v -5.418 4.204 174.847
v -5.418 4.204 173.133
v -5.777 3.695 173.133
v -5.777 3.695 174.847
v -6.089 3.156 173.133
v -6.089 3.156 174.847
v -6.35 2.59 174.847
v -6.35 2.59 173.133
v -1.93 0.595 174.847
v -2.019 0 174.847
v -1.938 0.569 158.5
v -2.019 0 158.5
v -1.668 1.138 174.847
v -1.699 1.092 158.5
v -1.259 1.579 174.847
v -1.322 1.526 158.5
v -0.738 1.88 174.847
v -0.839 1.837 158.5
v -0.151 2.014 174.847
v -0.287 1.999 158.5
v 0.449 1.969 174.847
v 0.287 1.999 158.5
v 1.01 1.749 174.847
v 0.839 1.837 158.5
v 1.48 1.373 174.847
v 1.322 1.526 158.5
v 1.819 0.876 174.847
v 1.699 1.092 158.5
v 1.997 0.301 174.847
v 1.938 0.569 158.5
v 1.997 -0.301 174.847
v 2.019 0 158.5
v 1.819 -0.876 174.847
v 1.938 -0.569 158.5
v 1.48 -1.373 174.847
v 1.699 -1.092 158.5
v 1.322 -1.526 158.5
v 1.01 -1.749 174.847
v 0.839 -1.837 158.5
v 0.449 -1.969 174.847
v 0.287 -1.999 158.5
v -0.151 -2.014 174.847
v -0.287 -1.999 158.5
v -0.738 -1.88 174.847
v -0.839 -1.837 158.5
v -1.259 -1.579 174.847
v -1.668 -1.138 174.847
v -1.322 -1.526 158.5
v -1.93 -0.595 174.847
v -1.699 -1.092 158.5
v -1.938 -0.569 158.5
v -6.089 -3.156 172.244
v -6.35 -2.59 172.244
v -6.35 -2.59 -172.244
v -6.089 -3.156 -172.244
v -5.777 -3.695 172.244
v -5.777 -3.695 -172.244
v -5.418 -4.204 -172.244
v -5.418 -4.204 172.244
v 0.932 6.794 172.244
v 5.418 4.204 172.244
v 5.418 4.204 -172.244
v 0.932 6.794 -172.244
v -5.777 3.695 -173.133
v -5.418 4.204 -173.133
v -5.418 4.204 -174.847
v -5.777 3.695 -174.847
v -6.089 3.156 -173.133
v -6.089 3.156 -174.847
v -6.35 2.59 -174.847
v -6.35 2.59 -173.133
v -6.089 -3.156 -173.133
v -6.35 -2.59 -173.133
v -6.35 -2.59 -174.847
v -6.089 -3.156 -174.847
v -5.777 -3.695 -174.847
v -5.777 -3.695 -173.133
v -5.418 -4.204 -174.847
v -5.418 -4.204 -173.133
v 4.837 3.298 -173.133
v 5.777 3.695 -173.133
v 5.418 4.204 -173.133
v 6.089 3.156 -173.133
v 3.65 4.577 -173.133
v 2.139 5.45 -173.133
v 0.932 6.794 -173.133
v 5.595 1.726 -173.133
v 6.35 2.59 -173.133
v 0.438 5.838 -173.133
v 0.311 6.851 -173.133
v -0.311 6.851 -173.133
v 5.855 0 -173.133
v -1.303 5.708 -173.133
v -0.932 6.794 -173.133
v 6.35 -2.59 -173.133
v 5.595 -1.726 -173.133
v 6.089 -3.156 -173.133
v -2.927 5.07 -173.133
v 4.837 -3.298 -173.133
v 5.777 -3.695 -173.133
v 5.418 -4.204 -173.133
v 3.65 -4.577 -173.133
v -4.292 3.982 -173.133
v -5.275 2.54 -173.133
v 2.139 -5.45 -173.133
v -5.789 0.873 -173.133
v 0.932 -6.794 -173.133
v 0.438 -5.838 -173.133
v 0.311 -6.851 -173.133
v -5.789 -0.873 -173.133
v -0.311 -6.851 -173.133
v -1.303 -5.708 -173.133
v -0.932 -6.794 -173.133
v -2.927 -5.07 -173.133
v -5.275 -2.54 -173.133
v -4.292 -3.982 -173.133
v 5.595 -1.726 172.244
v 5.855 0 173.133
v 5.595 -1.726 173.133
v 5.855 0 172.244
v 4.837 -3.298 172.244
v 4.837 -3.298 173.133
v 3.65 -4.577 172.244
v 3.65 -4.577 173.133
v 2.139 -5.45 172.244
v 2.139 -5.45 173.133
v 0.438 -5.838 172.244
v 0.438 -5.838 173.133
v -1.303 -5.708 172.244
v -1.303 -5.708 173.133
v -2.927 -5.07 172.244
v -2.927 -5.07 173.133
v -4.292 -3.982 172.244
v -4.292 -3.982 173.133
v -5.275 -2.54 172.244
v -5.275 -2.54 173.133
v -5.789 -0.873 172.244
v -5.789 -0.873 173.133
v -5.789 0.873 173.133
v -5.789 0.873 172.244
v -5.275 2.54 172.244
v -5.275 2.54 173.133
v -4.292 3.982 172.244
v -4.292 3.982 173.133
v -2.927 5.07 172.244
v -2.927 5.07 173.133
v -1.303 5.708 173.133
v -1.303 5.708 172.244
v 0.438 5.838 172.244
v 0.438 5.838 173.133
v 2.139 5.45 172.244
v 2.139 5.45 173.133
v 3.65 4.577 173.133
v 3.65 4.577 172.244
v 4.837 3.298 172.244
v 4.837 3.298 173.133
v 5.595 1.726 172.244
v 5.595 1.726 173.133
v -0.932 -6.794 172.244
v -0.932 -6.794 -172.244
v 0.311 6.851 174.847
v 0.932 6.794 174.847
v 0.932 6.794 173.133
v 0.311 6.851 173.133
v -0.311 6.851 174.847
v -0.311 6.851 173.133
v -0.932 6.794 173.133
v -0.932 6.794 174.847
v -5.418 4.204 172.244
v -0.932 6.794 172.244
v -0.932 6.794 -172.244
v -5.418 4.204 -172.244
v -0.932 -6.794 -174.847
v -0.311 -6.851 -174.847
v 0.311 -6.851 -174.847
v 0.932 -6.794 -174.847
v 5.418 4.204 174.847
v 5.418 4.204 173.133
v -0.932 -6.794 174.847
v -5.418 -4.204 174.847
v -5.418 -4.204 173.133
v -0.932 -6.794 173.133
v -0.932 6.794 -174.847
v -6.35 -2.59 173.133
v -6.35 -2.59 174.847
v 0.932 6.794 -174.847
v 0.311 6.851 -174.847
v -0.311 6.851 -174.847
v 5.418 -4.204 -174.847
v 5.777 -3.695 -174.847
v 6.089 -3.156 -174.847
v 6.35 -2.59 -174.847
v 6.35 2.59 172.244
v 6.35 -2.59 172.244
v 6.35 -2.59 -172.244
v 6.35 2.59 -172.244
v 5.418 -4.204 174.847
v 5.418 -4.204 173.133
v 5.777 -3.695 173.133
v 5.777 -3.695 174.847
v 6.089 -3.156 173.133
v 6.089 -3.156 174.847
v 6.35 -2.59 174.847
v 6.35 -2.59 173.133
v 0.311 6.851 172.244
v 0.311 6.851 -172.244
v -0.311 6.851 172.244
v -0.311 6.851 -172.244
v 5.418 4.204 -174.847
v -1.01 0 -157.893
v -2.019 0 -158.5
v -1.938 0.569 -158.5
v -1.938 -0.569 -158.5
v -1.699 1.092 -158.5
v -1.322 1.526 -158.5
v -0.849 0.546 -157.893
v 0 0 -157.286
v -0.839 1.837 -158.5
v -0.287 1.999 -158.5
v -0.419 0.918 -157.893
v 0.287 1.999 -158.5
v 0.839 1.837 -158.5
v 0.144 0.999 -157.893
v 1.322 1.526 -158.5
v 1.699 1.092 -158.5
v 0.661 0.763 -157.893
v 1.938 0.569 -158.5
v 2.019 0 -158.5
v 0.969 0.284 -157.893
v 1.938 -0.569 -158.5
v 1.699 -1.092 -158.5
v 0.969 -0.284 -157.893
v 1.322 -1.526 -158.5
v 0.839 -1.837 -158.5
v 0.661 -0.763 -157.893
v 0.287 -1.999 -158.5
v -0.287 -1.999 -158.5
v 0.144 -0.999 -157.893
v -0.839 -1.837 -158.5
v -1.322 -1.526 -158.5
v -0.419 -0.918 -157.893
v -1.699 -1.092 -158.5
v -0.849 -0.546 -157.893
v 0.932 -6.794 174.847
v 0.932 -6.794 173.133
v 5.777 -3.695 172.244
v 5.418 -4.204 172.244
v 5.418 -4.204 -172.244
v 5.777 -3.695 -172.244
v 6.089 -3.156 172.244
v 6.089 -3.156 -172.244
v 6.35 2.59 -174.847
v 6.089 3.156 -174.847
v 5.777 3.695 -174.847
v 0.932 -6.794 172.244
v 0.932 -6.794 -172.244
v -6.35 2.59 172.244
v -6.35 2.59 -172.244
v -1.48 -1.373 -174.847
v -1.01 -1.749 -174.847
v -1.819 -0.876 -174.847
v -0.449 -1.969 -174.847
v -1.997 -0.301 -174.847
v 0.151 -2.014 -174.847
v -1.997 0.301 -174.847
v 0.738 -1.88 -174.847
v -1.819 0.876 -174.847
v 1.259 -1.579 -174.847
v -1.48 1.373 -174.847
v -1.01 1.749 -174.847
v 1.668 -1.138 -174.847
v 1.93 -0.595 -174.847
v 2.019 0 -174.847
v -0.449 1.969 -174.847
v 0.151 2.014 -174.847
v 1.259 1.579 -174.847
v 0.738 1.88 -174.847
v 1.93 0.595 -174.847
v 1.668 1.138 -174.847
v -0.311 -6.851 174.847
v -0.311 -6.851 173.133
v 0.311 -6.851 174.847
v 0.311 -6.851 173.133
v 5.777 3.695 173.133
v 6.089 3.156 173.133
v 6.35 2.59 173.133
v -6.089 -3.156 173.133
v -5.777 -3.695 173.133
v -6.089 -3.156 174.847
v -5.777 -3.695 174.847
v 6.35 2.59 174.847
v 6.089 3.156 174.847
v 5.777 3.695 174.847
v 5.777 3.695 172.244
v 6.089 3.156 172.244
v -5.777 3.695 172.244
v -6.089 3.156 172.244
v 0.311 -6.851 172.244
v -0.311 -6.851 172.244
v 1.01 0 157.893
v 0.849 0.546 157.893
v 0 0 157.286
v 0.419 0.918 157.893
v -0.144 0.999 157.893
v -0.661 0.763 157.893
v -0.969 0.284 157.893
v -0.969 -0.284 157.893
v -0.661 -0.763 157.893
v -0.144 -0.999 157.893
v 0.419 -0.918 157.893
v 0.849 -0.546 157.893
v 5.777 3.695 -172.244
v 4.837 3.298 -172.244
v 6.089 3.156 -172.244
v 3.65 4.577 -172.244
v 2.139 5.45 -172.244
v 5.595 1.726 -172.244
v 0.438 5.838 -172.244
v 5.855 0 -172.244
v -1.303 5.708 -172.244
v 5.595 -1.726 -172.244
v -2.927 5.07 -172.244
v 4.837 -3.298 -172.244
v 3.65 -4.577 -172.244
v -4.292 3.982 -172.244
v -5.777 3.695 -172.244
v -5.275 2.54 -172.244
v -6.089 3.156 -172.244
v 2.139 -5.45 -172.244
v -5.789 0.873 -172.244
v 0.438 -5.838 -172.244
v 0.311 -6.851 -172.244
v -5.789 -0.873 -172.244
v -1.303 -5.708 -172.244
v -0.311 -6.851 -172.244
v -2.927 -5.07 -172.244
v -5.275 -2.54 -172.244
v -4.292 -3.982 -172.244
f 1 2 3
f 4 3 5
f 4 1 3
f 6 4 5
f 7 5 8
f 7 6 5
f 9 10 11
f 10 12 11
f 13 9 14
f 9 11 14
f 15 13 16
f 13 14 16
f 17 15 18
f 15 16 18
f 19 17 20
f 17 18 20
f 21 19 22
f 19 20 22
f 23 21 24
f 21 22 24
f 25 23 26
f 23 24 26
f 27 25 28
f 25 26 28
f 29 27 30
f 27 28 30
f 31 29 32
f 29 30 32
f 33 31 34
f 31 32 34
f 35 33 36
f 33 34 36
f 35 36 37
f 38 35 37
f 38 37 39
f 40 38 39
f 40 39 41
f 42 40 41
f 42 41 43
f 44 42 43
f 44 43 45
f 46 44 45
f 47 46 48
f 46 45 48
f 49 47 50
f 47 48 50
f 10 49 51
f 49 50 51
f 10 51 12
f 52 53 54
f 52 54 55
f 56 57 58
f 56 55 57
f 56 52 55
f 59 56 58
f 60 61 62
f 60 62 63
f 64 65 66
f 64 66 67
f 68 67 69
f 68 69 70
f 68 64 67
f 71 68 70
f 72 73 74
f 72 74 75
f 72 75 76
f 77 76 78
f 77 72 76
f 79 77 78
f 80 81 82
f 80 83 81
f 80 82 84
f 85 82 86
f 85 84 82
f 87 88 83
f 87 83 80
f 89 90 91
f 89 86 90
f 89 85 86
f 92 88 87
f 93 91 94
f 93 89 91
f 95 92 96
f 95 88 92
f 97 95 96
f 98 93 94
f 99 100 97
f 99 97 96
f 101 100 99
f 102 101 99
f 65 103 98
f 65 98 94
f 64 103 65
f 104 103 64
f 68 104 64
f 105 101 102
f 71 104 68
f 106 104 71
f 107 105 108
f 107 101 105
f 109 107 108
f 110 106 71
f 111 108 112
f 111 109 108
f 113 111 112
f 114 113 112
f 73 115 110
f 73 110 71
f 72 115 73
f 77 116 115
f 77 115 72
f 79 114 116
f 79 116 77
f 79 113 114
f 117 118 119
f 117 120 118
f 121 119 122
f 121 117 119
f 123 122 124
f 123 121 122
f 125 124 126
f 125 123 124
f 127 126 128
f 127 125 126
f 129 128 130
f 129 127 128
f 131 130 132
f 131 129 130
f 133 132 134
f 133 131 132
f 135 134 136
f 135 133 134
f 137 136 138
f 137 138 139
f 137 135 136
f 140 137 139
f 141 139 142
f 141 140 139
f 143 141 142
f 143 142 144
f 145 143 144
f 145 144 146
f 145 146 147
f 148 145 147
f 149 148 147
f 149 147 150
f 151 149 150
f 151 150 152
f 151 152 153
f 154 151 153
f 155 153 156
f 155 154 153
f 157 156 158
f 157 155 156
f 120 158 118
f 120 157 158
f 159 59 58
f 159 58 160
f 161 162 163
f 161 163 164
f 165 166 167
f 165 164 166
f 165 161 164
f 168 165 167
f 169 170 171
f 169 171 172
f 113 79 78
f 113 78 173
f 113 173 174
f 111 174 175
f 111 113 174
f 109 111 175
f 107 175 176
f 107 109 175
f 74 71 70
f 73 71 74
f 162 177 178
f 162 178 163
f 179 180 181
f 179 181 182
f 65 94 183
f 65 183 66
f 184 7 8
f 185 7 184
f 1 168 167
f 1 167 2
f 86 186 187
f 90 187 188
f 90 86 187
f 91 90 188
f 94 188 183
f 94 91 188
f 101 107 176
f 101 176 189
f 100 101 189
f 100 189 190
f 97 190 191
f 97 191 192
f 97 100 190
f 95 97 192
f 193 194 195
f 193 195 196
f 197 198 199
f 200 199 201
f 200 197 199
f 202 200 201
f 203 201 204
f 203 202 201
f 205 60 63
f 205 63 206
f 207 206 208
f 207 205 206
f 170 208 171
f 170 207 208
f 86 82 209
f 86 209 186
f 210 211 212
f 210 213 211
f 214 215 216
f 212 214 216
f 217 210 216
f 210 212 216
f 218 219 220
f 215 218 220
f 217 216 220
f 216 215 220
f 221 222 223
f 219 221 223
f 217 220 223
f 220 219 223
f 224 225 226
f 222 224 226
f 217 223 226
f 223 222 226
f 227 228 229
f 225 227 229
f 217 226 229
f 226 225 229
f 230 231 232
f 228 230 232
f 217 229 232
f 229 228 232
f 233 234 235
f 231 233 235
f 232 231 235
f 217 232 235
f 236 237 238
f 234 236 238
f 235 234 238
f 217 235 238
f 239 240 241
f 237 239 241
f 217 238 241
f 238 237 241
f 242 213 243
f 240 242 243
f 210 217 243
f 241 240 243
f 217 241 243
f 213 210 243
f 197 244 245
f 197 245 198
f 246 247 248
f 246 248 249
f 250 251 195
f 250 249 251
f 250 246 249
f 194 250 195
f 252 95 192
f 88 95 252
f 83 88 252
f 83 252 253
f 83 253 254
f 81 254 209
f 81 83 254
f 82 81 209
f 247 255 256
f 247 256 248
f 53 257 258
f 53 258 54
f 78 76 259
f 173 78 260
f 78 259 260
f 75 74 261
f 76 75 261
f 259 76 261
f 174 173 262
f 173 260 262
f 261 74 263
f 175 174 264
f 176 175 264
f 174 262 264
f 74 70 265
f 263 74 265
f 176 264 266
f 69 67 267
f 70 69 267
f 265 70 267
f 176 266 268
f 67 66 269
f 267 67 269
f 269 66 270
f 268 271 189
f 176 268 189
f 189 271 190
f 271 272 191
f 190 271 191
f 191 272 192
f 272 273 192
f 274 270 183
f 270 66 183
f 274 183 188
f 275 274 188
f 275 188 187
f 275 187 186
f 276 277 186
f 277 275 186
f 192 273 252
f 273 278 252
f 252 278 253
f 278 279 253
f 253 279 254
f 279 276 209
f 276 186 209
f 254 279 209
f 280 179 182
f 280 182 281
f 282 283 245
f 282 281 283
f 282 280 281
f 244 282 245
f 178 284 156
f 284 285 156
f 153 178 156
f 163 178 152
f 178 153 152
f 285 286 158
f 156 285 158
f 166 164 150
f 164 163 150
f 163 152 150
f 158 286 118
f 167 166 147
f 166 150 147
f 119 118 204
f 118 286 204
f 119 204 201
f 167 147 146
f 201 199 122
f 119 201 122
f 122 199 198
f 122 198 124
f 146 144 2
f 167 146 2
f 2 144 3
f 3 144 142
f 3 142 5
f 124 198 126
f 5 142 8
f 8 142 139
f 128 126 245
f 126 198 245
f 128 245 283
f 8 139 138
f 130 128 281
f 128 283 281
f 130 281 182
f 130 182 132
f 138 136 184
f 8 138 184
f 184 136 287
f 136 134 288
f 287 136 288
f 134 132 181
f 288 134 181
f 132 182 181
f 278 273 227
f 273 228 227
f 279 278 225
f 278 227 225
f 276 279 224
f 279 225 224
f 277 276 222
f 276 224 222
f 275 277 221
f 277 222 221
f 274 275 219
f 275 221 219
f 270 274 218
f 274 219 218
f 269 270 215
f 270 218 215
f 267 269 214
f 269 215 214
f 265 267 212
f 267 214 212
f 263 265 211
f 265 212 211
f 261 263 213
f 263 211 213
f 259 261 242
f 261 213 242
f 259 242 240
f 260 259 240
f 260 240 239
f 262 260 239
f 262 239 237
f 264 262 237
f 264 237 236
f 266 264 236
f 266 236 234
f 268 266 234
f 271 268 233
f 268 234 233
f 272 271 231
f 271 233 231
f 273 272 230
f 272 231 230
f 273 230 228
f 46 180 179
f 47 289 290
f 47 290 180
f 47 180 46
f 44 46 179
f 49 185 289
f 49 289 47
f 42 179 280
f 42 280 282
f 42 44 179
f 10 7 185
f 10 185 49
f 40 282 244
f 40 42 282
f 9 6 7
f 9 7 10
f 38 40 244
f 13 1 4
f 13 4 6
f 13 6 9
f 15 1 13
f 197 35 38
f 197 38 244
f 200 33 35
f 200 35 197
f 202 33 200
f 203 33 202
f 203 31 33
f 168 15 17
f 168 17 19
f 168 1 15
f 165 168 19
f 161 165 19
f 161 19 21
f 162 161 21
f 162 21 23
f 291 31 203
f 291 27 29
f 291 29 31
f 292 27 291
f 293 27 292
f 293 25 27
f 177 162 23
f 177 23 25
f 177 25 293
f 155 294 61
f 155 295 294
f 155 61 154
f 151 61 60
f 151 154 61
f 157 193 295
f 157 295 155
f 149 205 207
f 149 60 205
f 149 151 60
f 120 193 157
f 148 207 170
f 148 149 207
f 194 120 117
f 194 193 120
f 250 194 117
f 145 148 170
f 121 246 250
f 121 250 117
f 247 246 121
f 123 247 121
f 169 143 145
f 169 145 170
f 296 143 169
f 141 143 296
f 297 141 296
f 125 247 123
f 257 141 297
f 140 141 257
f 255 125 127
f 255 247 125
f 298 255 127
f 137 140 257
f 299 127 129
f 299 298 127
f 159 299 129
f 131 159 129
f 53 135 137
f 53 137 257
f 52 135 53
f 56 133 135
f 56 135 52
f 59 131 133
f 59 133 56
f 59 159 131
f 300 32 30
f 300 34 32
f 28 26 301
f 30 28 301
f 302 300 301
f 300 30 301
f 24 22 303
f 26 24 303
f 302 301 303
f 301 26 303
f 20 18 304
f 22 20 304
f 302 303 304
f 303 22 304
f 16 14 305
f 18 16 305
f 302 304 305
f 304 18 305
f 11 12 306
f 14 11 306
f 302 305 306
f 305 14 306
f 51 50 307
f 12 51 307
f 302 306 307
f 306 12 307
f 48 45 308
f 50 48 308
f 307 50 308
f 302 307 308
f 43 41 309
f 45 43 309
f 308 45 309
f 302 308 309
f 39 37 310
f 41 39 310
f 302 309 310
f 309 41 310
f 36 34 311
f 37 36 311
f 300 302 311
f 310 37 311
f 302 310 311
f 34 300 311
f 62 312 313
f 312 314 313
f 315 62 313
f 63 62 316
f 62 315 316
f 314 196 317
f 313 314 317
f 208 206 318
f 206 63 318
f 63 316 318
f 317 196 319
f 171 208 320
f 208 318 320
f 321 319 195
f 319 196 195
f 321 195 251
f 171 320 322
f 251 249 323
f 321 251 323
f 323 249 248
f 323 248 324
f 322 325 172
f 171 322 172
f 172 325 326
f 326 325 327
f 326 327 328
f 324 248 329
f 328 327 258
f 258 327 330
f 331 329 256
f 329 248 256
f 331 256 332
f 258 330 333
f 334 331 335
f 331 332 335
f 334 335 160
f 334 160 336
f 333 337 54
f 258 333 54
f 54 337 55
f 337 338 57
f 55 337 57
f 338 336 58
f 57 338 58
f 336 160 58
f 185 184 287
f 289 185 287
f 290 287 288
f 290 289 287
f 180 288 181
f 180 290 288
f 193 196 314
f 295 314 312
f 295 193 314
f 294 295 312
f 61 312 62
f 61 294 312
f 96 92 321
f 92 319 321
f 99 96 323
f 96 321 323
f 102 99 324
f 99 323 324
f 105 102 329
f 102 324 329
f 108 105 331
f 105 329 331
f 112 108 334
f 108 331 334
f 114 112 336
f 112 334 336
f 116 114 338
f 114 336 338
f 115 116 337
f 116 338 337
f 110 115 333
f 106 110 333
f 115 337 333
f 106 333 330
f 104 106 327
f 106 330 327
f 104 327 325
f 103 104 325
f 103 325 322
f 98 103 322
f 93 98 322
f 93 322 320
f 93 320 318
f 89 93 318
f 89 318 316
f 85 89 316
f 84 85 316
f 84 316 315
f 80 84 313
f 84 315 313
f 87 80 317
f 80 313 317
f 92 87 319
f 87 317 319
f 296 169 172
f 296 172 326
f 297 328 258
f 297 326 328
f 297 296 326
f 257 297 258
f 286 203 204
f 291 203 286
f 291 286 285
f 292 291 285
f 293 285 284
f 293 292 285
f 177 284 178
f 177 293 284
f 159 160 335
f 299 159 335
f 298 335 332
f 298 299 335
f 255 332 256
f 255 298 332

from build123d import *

# Parameters (mm, degrees)
BOSS_EXTRUDE1_DEPTH                  = 174.84725
F_10_32_TAPPED_HOLE1_D               = 4.0386
F_10_32_TAPPED_HOLE1_DEPTH           = 16.34744
F_10_32_TAPPED_HOLE1_TIP             = 1.213317848
F_10_32_TAPPED_HOLE1_ON_FACE_2_D     = 4.0386
F_10_32_TAPPED_HOLE1_ON_FACE_2_DEPTH = 16.34744
F_10_32_TAPPED_HOLE1_ON_FACE_2_TIP   = 1.213317848
SKETCH3_W                            = 0.889
SKETCH3_H                            = 1.0033


with BuildPart() as part:
    # Sketch1 → Boss-Extrude1 (new, symmetric)
    with BuildSketch(Plane.XY):
        with BuildLine():
            ThreePointArc((0.93173274, 6.79441227), (0, 6.858), (-0.93173274, 6.79441227))
            Line((-0.93173274, 6.79441227), (-5.41826726, 4.204110358))
            ThreePointArc((-5.41826726, 4.204110358), (-5.939202219, 3.429), (-6.35, 2.590301913))
            Line((-6.35, 2.590301913), (-6.35, -2.590301913))
            ThreePointArc((-6.35, -2.590301913), (-5.939202219, -3.429), (-5.41826726, -4.204110358))
            Line((-5.41826726, -4.204110358), (-0.93173274, -6.79441227))
            ThreePointArc((-0.93173274, -6.79441227), (0, -6.858), (0.93173274, -6.79441227))
            Line((0.93173274, -6.79441227), (5.41826726, -4.204110358))
            ThreePointArc((5.41826726, -4.204110358), (5.939202219, -3.429), (6.35, -2.590301913))
            Line((6.35, -2.590301913), (6.35, 2.590301913))
            ThreePointArc((6.35, 2.590301913), (5.939202219, 3.429), (5.41826726, 4.204110358))
            Line((5.41826726, 4.204110358), (0.93173274, 6.79441227))
        make_face()
    extrude(amount=BOSS_EXTRUDE1_DEPTH, both=True)

    # #10-32 Tapped Hole1
    with Locations(Plane.XY.offset(174.84725)):
        with Locations((0, 0)):
            Hole(F_10_32_TAPPED_HOLE1_D / 2, depth=F_10_32_TAPPED_HOLE1_DEPTH)
            with Locations((0, 0, -(F_10_32_TAPPED_HOLE1_DEPTH + F_10_32_TAPPED_HOLE1_TIP / 2))):  # 118° drill point
                Cone(0, F_10_32_TAPPED_HOLE1_D / 2, F_10_32_TAPPED_HOLE1_TIP, mode=Mode.SUBTRACT)

    # #10-32 Tapped Hole1 on face 2
    with Locations(Plane(origin=(0, 0, -174.84725), x_dir=(-1, 0, 0), z_dir=(0, 0, -1))):
        with Locations((0, 0)):
            Hole(F_10_32_TAPPED_HOLE1_ON_FACE_2_D / 2, depth=F_10_32_TAPPED_HOLE1_ON_FACE_2_DEPTH)
            with Locations((0, 0, -(F_10_32_TAPPED_HOLE1_ON_FACE_2_DEPTH + F_10_32_TAPPED_HOLE1_ON_FACE_2_TIP / 2))):  # 118° drill point
                Cone(0, F_10_32_TAPPED_HOLE1_ON_FACE_2_D / 2, F_10_32_TAPPED_HOLE1_ON_FACE_2_TIP, mode=Mode.SUBTRACT)

    # Sketch3 → Cut-Revolve1 (revolve, cut)
    with BuildSketch(Plane(origin=(0, 0, 0), x_dir=(0, 0, -1), z_dir=(1, 0, 0)), mode=Mode.PRIVATE) as cut_revolve1_sk:
        with Locations((-172.68825, 6.35635)):
            Rectangle(SKETCH3_W, SKETCH3_H)
    cut_revolve1 = revolve(cut_revolve1_sk.sketch.rotate(Axis((0, 0, 175.157387885), (0, 0, -1)), 90), axis=Axis((0, 0, 175.157387885), (0, 0, -1)), mode=Mode.SUBTRACT)

    # Mirror1: Cut-Revolve1 across plane
    add(cut_revolve1.mirror(Plane.XY), mode=Mode.SUBTRACT)


solid = part.part
